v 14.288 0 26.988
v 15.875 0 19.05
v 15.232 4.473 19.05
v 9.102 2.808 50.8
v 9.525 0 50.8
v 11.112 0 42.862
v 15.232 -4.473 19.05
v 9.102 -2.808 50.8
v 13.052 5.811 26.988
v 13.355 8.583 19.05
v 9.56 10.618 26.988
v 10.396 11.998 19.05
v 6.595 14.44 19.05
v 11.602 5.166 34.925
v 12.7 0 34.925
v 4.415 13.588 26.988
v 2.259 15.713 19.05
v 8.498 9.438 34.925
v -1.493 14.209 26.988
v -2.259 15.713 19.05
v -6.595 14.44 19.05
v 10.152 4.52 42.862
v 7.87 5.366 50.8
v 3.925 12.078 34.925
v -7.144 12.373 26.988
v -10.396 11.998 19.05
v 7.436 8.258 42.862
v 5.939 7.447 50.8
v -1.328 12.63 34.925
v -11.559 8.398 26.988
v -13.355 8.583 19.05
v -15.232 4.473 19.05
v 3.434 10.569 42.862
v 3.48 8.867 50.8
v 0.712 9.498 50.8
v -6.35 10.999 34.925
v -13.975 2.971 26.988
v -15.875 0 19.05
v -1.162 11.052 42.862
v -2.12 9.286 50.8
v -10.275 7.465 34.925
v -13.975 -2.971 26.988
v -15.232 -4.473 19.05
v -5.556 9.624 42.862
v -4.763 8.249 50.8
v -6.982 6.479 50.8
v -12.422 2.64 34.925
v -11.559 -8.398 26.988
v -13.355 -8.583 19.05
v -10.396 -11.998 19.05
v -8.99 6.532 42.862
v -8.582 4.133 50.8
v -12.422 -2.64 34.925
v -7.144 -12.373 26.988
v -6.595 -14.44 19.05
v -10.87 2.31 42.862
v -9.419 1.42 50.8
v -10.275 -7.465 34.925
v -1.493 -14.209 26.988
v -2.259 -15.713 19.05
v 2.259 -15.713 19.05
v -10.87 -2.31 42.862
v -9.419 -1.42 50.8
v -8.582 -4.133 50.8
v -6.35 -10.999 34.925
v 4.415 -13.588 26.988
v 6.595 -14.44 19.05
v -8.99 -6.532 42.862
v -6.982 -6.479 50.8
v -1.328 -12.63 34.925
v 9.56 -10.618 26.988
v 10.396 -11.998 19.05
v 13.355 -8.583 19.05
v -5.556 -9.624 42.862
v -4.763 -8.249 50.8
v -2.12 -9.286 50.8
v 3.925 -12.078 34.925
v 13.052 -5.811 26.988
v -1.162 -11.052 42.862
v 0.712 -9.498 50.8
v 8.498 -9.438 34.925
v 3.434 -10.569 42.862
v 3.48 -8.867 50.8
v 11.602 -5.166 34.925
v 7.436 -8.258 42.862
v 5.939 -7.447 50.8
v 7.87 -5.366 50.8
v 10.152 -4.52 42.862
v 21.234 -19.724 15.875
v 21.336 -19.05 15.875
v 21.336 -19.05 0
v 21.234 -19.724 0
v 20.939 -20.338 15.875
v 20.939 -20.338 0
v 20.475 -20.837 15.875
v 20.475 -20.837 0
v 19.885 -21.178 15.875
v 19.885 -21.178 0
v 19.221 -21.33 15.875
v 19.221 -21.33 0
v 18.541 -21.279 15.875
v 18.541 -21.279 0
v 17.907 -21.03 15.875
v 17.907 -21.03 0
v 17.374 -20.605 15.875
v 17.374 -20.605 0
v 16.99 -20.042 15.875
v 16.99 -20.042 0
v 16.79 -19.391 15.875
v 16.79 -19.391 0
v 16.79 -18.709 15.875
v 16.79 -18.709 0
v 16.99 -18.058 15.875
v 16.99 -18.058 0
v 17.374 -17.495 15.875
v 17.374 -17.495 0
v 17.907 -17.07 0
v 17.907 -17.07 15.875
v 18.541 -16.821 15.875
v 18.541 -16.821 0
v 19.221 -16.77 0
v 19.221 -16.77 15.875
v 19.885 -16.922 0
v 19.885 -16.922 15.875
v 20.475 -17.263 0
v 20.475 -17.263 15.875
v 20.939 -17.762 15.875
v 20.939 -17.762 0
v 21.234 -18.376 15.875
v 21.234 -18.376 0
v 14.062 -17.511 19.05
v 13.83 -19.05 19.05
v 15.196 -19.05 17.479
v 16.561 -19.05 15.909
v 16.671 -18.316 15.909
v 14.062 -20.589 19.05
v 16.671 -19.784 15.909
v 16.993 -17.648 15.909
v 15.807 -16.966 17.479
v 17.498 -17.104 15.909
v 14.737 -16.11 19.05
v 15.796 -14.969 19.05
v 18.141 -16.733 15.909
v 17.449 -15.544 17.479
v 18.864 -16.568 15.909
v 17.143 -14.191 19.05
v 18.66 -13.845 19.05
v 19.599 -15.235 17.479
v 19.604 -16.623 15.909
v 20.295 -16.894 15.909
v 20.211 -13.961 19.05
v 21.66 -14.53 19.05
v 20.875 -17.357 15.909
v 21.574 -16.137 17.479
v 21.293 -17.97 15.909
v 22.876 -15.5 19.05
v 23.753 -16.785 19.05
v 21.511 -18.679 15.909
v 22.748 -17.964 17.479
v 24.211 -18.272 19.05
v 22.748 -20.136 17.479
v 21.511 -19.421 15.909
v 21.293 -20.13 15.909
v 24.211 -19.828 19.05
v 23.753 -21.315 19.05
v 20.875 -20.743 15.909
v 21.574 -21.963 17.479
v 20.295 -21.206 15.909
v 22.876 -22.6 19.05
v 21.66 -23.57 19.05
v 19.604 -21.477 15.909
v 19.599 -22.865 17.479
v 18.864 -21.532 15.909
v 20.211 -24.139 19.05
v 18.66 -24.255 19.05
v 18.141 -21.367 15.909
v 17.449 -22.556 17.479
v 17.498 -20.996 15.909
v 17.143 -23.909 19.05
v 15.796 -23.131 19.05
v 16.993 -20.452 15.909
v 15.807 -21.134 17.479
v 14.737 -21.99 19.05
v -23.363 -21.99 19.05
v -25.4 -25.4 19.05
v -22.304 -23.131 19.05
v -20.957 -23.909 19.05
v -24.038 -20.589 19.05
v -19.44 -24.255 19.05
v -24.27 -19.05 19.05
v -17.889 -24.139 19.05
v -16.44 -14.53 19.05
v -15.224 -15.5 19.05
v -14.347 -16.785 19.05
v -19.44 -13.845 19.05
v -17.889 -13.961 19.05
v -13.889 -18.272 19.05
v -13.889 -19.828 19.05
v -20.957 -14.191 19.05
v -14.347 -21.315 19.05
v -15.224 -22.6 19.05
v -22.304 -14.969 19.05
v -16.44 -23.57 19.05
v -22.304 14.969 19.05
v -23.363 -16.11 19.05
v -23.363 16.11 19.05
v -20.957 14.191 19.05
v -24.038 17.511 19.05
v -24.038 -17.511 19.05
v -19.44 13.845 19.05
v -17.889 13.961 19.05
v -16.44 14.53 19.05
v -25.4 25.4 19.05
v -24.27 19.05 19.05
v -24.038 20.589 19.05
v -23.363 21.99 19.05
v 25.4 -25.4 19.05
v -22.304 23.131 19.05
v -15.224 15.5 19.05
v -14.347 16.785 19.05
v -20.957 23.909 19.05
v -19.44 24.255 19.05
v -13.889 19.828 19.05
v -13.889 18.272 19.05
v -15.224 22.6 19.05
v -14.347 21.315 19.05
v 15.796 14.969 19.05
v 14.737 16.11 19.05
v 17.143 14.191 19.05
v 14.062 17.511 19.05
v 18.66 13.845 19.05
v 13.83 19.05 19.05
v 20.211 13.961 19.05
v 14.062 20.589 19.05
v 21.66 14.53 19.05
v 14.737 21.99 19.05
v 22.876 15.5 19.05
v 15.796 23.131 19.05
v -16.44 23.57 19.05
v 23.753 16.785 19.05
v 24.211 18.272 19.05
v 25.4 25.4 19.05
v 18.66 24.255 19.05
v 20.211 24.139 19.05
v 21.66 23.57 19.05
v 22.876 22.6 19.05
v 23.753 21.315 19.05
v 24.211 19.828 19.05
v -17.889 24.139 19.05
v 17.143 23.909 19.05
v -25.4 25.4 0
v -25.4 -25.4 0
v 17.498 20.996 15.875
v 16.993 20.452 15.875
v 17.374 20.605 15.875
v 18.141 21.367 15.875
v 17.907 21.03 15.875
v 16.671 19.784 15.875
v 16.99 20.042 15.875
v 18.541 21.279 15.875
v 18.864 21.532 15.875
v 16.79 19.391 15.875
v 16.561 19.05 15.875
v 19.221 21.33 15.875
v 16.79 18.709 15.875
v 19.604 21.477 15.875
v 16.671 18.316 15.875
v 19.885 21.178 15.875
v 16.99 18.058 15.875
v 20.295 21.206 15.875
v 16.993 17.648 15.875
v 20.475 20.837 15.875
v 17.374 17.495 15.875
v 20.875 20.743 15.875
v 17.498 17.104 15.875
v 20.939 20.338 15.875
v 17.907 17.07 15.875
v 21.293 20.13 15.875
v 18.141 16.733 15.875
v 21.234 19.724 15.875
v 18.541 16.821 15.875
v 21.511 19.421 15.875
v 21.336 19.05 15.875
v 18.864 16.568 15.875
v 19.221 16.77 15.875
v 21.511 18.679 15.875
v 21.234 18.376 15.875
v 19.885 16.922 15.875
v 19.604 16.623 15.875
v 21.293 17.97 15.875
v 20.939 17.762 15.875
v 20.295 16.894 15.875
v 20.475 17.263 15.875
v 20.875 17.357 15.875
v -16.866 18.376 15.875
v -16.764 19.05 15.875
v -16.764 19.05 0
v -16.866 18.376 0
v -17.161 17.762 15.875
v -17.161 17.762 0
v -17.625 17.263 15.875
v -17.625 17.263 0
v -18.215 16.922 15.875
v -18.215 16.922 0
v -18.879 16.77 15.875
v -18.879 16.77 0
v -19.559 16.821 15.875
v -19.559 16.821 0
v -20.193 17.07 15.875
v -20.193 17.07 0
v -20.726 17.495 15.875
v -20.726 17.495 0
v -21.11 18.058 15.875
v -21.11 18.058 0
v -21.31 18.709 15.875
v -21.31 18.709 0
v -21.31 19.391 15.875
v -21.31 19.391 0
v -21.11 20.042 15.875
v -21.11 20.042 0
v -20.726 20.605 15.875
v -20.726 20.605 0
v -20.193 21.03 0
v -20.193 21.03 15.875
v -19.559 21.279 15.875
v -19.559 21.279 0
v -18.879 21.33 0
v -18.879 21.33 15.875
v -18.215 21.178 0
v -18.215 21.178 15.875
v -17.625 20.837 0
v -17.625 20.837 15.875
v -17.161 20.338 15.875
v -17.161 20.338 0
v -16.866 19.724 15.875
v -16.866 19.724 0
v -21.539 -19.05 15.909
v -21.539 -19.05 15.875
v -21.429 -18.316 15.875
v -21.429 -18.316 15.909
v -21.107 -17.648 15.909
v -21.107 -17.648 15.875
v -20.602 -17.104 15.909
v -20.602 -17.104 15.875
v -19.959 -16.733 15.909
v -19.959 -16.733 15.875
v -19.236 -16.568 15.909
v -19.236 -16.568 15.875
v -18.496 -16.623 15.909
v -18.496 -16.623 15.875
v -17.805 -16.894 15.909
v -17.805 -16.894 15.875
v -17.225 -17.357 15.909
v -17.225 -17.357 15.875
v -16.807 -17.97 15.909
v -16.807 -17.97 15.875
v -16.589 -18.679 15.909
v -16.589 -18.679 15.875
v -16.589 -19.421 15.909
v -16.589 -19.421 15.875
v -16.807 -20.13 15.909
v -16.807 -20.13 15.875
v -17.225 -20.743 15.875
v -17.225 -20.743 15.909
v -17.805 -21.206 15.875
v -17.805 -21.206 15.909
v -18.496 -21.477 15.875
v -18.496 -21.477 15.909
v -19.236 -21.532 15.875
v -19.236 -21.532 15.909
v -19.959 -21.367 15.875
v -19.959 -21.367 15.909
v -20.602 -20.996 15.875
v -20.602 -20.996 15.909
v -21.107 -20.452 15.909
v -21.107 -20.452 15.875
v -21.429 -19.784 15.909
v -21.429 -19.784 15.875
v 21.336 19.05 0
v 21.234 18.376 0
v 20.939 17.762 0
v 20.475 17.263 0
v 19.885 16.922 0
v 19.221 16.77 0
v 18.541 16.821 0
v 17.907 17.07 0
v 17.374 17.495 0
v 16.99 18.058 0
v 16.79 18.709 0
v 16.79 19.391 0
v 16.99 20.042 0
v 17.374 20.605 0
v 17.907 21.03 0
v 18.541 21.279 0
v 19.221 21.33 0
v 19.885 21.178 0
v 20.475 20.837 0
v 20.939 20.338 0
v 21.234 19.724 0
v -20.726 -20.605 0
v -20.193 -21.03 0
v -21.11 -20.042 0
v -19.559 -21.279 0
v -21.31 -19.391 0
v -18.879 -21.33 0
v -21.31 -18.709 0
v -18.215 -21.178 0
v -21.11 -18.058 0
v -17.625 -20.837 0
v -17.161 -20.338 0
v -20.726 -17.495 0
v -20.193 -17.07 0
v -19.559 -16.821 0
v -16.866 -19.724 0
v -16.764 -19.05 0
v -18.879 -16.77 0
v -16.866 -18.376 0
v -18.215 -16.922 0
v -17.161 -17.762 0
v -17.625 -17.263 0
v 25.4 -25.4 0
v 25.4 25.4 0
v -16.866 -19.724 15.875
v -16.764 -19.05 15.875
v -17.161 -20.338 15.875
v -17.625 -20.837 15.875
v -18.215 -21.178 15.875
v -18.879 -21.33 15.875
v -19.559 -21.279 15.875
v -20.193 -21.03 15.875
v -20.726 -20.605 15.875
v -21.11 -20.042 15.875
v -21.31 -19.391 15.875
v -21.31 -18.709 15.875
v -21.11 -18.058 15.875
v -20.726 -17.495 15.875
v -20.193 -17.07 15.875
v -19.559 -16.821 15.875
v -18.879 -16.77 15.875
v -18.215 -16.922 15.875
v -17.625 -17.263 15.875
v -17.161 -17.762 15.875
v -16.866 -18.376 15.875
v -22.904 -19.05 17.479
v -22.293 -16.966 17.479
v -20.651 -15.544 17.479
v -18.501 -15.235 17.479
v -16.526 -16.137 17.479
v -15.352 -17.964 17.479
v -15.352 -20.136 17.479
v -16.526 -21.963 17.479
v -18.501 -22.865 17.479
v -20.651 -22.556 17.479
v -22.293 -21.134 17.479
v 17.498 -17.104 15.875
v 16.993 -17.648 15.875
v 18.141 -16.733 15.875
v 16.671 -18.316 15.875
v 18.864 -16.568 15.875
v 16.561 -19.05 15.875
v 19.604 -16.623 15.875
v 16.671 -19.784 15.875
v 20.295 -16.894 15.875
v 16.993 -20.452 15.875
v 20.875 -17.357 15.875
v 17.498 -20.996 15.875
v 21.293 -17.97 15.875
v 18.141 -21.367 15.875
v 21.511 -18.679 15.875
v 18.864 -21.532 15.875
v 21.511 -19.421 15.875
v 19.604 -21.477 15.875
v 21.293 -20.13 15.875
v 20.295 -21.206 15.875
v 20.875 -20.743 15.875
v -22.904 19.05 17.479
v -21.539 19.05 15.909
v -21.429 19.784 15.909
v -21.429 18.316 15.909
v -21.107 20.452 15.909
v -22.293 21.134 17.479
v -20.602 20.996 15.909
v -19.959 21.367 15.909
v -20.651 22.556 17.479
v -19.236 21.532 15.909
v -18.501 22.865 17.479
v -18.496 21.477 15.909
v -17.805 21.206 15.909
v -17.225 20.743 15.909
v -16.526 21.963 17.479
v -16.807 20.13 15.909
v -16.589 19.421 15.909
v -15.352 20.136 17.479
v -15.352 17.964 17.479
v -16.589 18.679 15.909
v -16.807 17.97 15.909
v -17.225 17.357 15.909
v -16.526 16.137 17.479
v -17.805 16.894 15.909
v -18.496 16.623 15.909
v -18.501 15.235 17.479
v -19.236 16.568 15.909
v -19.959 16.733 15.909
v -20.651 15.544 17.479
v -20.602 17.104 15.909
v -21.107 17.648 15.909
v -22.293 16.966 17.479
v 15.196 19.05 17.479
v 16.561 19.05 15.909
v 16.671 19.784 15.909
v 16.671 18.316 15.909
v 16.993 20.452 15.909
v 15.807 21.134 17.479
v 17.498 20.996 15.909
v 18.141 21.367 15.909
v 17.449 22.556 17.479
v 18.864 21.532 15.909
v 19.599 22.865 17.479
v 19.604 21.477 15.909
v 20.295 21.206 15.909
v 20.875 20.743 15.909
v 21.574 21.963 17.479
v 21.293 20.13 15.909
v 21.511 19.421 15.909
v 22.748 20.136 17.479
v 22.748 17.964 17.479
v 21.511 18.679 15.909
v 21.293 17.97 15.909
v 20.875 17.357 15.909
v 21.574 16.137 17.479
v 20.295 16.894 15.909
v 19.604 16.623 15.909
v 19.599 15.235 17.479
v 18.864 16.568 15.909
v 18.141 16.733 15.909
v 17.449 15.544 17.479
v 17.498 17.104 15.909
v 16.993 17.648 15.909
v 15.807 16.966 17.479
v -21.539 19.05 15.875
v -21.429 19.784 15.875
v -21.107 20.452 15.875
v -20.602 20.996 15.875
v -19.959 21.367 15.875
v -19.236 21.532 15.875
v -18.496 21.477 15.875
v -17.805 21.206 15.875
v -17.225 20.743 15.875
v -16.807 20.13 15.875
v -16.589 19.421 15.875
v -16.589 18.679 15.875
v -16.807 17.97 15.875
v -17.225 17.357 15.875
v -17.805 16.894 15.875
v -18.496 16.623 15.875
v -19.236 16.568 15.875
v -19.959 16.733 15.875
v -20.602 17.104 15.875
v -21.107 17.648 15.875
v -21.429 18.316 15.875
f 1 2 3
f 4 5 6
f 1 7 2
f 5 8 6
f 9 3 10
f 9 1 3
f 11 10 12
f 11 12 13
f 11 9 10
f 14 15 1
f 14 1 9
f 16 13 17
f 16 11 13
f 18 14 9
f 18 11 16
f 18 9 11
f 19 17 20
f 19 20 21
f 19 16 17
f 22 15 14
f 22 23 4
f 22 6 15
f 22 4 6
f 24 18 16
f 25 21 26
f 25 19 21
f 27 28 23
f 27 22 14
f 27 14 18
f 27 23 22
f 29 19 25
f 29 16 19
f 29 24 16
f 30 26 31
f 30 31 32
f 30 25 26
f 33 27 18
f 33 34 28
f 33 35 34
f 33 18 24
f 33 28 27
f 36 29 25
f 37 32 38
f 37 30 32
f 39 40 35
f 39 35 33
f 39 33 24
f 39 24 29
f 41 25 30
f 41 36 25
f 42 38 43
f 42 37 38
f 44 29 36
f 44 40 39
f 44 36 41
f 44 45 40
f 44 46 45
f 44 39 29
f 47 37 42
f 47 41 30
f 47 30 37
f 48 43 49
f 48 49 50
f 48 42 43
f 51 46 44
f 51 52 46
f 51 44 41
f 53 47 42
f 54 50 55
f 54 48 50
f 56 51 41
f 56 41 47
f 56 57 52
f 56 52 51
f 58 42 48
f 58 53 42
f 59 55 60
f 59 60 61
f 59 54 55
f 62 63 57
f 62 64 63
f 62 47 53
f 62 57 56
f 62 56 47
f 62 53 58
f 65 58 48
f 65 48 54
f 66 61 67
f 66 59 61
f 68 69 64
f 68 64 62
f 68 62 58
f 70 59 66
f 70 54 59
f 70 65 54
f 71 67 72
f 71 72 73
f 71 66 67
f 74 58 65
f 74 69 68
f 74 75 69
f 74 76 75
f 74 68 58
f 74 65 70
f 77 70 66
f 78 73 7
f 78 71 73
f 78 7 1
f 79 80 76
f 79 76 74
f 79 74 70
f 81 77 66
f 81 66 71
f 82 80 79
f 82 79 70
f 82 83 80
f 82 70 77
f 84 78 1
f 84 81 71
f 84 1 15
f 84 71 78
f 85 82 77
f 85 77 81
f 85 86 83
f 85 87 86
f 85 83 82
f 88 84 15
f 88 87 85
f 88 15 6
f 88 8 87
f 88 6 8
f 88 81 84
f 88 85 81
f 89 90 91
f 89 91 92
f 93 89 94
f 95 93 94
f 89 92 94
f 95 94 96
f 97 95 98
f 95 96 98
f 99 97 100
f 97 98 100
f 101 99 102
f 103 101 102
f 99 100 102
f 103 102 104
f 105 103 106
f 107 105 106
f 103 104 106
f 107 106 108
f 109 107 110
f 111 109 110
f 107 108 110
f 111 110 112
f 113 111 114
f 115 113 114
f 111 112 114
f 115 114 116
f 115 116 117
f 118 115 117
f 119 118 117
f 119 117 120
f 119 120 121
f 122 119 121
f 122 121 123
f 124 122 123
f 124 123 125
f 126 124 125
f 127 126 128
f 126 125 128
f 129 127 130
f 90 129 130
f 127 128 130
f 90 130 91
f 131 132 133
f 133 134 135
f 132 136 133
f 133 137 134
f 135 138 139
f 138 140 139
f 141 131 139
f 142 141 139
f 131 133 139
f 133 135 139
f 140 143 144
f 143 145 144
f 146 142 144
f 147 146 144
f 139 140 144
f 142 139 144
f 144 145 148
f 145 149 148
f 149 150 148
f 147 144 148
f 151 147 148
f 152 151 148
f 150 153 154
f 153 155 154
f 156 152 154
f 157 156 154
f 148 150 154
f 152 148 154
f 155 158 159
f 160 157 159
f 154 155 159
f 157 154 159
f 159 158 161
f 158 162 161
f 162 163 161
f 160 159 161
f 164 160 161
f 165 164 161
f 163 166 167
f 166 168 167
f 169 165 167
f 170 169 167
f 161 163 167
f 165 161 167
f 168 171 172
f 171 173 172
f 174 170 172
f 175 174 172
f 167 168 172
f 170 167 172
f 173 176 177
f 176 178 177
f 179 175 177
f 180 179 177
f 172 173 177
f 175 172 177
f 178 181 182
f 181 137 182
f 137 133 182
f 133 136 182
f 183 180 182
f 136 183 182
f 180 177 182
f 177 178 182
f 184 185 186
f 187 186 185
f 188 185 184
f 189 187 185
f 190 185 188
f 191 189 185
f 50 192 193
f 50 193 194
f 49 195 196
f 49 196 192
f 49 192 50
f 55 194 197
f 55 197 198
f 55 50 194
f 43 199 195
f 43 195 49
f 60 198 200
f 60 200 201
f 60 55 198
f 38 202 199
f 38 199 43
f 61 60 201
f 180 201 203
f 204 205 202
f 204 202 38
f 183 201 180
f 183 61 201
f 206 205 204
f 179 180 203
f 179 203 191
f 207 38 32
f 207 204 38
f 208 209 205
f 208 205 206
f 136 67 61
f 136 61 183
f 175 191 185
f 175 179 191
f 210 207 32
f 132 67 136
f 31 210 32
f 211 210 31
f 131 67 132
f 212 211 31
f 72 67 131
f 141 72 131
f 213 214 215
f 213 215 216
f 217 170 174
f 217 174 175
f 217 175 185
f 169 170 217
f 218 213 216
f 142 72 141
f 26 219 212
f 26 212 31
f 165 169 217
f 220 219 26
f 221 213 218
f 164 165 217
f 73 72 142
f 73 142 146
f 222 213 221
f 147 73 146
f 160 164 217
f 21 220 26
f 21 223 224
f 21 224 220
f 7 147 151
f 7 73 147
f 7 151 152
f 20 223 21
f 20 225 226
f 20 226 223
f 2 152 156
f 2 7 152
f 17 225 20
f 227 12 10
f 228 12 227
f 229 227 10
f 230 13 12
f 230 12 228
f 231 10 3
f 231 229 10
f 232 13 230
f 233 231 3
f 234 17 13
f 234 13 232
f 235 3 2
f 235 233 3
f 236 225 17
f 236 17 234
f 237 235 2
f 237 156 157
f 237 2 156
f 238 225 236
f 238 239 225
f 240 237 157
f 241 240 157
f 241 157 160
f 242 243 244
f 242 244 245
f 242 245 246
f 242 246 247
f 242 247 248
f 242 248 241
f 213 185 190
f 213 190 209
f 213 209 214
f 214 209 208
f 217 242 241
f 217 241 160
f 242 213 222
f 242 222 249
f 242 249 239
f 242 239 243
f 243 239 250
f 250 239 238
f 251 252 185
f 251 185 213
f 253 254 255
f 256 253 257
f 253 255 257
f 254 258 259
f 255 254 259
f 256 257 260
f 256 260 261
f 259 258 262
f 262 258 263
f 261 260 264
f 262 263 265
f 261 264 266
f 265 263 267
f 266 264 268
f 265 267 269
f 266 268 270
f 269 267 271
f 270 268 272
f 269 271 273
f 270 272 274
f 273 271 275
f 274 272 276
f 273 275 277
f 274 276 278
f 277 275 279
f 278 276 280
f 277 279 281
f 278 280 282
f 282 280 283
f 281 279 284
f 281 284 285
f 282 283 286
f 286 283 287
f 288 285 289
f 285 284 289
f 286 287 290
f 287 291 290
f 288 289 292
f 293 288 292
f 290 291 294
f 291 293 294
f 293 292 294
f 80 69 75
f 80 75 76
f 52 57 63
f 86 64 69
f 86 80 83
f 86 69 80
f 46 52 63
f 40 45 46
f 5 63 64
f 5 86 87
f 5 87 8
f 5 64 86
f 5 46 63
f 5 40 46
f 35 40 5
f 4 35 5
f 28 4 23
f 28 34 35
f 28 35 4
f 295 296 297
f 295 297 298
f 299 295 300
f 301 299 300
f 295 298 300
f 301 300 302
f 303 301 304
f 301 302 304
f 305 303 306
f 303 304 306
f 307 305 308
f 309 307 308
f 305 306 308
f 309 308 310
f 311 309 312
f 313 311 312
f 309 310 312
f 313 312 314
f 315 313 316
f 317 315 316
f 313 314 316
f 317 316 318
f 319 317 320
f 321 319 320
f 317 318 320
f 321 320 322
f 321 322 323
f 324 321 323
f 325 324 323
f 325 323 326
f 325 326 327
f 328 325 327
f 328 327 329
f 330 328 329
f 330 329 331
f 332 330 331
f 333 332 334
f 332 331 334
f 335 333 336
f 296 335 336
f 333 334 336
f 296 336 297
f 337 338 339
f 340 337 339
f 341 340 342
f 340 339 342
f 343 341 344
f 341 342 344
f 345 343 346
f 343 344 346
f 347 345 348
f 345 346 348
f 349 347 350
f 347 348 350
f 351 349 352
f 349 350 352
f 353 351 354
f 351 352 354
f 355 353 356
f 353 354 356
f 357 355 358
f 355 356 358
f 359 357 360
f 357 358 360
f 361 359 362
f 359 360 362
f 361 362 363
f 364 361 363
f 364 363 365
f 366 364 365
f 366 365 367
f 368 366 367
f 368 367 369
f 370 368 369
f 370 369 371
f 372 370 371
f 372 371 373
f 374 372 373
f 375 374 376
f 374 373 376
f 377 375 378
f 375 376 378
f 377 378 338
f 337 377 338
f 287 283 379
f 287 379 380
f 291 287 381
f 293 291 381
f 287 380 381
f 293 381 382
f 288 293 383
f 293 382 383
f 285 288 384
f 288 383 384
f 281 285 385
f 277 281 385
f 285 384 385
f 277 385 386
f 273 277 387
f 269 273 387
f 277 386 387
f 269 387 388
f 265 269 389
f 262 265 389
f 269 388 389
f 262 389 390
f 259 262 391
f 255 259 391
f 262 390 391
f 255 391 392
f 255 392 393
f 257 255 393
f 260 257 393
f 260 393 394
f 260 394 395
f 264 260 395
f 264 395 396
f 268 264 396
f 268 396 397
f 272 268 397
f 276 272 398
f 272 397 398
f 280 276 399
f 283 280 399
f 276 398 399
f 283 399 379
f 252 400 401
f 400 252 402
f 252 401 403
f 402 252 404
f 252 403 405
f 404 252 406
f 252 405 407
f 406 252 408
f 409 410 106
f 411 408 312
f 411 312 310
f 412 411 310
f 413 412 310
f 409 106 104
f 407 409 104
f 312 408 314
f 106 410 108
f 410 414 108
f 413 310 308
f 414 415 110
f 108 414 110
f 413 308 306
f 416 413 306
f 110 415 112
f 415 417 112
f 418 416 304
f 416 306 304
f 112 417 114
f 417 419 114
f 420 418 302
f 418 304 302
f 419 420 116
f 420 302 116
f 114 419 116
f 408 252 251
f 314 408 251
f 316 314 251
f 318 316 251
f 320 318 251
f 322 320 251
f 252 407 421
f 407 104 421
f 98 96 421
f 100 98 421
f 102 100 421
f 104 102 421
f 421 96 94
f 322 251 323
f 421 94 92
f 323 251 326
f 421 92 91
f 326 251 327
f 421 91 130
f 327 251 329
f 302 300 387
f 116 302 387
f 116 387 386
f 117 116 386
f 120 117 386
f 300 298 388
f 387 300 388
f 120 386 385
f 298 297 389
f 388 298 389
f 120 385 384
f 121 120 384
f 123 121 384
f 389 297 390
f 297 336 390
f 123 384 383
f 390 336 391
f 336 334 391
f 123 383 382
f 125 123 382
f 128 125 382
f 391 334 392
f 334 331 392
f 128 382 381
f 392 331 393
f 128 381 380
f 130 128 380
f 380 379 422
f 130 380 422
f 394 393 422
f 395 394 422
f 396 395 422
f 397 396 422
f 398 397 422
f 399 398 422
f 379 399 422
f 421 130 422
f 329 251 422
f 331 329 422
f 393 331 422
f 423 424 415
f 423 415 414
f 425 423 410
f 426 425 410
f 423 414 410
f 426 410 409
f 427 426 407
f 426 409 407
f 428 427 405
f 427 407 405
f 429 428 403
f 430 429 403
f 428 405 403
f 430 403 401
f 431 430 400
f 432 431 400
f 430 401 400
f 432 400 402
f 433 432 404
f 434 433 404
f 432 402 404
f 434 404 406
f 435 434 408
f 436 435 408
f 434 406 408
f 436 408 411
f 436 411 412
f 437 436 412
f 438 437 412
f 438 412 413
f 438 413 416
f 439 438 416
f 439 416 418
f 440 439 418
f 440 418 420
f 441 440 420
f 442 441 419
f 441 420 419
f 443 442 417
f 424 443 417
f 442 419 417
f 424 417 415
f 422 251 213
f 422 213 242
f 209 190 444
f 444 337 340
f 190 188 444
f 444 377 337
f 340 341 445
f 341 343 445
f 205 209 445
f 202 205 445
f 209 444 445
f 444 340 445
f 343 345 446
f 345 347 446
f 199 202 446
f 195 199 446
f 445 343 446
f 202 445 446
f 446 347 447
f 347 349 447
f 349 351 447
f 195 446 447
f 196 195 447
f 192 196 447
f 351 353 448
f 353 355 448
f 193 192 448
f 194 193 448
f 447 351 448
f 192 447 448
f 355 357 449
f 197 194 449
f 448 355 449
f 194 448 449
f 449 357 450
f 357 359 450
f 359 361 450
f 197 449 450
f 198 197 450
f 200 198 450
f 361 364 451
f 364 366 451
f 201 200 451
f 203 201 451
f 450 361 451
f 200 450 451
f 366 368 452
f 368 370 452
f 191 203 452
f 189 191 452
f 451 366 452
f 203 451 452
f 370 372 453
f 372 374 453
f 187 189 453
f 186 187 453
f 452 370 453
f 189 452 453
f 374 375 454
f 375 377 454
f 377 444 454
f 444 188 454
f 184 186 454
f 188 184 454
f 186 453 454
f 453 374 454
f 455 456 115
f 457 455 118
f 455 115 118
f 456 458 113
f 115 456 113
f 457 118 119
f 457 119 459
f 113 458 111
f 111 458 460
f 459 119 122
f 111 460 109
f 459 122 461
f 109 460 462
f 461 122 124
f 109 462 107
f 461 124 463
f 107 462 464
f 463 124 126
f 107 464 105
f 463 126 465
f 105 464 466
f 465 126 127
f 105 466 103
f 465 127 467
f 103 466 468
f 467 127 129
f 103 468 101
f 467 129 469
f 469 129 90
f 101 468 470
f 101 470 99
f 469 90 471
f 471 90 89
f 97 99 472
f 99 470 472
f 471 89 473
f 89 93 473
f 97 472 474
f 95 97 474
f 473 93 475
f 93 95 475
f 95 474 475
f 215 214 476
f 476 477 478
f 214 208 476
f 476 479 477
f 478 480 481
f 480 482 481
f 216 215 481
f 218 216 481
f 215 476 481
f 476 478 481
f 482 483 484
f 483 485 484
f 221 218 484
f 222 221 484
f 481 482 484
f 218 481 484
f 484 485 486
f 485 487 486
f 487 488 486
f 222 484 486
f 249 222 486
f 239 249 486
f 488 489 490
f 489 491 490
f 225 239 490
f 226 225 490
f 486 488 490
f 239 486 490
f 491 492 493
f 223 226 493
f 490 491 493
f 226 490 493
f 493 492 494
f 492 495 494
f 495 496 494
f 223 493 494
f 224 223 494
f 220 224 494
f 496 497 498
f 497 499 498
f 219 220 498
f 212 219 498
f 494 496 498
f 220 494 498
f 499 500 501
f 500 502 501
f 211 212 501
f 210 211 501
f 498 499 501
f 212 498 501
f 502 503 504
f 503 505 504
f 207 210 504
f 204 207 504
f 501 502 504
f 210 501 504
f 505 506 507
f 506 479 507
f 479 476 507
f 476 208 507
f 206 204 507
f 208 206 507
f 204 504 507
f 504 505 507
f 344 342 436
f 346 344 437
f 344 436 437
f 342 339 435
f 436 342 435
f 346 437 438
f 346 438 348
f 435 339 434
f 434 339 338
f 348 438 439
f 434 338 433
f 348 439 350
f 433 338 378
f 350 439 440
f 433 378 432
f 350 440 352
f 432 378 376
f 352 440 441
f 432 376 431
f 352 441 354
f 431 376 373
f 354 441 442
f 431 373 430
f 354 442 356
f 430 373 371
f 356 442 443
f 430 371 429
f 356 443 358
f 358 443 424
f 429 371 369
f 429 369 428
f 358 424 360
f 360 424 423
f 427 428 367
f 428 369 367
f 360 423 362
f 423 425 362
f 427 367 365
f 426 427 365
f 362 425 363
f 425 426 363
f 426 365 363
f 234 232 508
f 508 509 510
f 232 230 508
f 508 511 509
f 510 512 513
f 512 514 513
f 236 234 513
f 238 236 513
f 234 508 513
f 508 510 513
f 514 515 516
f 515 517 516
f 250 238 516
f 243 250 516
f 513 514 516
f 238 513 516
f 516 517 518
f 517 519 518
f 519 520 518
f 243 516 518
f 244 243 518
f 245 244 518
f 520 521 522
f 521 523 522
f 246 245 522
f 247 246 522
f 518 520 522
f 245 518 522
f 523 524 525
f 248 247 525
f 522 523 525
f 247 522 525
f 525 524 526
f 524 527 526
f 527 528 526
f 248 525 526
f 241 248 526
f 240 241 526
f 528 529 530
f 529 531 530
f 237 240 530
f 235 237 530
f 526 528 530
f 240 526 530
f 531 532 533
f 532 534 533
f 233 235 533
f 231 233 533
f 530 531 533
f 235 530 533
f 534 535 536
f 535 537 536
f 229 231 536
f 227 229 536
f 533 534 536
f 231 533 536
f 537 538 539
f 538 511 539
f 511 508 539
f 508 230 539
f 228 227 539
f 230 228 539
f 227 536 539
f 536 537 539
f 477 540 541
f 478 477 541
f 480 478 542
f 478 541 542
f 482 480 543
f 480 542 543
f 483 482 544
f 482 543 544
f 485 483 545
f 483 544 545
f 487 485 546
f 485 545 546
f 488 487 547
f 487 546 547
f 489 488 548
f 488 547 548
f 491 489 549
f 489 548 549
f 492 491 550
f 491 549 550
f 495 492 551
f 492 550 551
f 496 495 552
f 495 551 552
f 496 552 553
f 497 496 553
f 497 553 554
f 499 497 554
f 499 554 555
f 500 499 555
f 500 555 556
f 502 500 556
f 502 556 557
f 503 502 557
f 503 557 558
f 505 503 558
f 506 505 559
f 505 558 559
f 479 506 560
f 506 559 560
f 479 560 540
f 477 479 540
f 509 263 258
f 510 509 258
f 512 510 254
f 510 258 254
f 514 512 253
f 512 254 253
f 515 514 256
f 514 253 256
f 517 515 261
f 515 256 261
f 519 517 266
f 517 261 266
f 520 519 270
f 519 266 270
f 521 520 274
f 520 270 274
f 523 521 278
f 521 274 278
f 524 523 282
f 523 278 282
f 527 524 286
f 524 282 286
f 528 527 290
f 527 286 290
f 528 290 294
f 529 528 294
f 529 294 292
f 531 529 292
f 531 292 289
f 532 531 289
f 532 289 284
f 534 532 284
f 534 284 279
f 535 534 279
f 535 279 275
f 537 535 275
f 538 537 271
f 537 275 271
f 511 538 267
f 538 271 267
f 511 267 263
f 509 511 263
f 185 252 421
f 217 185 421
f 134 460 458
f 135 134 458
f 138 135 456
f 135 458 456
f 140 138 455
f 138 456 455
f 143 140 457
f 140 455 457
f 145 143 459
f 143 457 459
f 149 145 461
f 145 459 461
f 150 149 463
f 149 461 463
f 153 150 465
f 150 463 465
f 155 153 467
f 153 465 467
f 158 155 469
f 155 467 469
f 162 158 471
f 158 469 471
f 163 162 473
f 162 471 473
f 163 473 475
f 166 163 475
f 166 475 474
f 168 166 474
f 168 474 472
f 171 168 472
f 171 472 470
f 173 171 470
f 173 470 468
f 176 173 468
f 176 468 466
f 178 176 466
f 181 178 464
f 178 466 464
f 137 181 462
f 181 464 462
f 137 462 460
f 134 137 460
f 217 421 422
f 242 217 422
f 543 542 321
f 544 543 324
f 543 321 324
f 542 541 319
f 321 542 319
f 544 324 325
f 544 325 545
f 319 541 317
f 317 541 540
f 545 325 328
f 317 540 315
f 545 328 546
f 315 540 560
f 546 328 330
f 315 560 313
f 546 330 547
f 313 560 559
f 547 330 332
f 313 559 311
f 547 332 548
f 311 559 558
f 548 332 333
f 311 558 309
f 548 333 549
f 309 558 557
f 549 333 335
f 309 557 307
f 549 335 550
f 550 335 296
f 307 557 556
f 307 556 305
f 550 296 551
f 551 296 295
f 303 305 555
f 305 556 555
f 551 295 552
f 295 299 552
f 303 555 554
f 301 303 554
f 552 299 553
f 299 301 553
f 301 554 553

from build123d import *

# Parameters (mm, degrees)
F0_W           = 50.8
F0_H           = 50.8
F1_DEPTH       = 19.05
F4_R           = 15.875
F3_R           = 9.525
F7_D           = 4.9784
F7_CSINK_D     = 10.4394
F7_CSINK_ANGLE = 82
F8_R           = 2.794
F8_R_2         = 2.286
F9_DEPTH       = 15.875


with BuildPart() as f1:
    # F0 (on Top) → F1 (new body)
    with BuildSketch(Plane.XY):
        Rectangle(F0_W, F0_H)
    extrude(amount=F1_DEPTH)

    # F4 (on face) → F5 section 0
    with BuildSketch(Plane.XY.offset(19.05)):
        Circle(F4_R)
    # F3 (on offset) → F5 section 1
    with BuildSketch(Plane.XY.offset(50.8)):
        Circle(F3_R)
    loft()

    # F7 (through all)
    with Locations(Plane.XY.offset(19.05)):
        with Locations((-19.05, 19.05), (19.05, 19.05), (19.05, -19.05), (-19.05, -19.05)):
            CounterSinkHole(F7_D / 2, F7_CSINK_D / 2, counter_sink_angle=F7_CSINK_ANGLE)

    # F8 (on face) → F9 (join)
    with BuildSketch(Plane(origin=(0, 0, 0), x_dir=(1, 0, 0), z_dir=(0, 0, -1))):
        with Locations((19.05, -19.05)):
            Circle(F8_R)
        with Locations((19.05, -19.05)):
            Circle(F8_R_2, mode=Mode.SUBTRACT)
        with Locations((19.05, 19.05)):
            Circle(F8_R)
        with Locations((19.05, 19.05)):
            Circle(F8_R_2, mode=Mode.SUBTRACT)
        with Locations((-19.05, 19.05)):
            Circle(F8_R)
        with Locations((-19.05, 19.05)):
            Circle(F8_R_2, mode=Mode.SUBTRACT)
        with Locations((-19.05, -19.05)):
            Circle(F8_R)
        with Locations((-19.05, -19.05)):
            Circle(F8_R_2, mode=Mode.SUBTRACT)
    extrude(amount=-F9_DEPTH)


solid = f1.part
